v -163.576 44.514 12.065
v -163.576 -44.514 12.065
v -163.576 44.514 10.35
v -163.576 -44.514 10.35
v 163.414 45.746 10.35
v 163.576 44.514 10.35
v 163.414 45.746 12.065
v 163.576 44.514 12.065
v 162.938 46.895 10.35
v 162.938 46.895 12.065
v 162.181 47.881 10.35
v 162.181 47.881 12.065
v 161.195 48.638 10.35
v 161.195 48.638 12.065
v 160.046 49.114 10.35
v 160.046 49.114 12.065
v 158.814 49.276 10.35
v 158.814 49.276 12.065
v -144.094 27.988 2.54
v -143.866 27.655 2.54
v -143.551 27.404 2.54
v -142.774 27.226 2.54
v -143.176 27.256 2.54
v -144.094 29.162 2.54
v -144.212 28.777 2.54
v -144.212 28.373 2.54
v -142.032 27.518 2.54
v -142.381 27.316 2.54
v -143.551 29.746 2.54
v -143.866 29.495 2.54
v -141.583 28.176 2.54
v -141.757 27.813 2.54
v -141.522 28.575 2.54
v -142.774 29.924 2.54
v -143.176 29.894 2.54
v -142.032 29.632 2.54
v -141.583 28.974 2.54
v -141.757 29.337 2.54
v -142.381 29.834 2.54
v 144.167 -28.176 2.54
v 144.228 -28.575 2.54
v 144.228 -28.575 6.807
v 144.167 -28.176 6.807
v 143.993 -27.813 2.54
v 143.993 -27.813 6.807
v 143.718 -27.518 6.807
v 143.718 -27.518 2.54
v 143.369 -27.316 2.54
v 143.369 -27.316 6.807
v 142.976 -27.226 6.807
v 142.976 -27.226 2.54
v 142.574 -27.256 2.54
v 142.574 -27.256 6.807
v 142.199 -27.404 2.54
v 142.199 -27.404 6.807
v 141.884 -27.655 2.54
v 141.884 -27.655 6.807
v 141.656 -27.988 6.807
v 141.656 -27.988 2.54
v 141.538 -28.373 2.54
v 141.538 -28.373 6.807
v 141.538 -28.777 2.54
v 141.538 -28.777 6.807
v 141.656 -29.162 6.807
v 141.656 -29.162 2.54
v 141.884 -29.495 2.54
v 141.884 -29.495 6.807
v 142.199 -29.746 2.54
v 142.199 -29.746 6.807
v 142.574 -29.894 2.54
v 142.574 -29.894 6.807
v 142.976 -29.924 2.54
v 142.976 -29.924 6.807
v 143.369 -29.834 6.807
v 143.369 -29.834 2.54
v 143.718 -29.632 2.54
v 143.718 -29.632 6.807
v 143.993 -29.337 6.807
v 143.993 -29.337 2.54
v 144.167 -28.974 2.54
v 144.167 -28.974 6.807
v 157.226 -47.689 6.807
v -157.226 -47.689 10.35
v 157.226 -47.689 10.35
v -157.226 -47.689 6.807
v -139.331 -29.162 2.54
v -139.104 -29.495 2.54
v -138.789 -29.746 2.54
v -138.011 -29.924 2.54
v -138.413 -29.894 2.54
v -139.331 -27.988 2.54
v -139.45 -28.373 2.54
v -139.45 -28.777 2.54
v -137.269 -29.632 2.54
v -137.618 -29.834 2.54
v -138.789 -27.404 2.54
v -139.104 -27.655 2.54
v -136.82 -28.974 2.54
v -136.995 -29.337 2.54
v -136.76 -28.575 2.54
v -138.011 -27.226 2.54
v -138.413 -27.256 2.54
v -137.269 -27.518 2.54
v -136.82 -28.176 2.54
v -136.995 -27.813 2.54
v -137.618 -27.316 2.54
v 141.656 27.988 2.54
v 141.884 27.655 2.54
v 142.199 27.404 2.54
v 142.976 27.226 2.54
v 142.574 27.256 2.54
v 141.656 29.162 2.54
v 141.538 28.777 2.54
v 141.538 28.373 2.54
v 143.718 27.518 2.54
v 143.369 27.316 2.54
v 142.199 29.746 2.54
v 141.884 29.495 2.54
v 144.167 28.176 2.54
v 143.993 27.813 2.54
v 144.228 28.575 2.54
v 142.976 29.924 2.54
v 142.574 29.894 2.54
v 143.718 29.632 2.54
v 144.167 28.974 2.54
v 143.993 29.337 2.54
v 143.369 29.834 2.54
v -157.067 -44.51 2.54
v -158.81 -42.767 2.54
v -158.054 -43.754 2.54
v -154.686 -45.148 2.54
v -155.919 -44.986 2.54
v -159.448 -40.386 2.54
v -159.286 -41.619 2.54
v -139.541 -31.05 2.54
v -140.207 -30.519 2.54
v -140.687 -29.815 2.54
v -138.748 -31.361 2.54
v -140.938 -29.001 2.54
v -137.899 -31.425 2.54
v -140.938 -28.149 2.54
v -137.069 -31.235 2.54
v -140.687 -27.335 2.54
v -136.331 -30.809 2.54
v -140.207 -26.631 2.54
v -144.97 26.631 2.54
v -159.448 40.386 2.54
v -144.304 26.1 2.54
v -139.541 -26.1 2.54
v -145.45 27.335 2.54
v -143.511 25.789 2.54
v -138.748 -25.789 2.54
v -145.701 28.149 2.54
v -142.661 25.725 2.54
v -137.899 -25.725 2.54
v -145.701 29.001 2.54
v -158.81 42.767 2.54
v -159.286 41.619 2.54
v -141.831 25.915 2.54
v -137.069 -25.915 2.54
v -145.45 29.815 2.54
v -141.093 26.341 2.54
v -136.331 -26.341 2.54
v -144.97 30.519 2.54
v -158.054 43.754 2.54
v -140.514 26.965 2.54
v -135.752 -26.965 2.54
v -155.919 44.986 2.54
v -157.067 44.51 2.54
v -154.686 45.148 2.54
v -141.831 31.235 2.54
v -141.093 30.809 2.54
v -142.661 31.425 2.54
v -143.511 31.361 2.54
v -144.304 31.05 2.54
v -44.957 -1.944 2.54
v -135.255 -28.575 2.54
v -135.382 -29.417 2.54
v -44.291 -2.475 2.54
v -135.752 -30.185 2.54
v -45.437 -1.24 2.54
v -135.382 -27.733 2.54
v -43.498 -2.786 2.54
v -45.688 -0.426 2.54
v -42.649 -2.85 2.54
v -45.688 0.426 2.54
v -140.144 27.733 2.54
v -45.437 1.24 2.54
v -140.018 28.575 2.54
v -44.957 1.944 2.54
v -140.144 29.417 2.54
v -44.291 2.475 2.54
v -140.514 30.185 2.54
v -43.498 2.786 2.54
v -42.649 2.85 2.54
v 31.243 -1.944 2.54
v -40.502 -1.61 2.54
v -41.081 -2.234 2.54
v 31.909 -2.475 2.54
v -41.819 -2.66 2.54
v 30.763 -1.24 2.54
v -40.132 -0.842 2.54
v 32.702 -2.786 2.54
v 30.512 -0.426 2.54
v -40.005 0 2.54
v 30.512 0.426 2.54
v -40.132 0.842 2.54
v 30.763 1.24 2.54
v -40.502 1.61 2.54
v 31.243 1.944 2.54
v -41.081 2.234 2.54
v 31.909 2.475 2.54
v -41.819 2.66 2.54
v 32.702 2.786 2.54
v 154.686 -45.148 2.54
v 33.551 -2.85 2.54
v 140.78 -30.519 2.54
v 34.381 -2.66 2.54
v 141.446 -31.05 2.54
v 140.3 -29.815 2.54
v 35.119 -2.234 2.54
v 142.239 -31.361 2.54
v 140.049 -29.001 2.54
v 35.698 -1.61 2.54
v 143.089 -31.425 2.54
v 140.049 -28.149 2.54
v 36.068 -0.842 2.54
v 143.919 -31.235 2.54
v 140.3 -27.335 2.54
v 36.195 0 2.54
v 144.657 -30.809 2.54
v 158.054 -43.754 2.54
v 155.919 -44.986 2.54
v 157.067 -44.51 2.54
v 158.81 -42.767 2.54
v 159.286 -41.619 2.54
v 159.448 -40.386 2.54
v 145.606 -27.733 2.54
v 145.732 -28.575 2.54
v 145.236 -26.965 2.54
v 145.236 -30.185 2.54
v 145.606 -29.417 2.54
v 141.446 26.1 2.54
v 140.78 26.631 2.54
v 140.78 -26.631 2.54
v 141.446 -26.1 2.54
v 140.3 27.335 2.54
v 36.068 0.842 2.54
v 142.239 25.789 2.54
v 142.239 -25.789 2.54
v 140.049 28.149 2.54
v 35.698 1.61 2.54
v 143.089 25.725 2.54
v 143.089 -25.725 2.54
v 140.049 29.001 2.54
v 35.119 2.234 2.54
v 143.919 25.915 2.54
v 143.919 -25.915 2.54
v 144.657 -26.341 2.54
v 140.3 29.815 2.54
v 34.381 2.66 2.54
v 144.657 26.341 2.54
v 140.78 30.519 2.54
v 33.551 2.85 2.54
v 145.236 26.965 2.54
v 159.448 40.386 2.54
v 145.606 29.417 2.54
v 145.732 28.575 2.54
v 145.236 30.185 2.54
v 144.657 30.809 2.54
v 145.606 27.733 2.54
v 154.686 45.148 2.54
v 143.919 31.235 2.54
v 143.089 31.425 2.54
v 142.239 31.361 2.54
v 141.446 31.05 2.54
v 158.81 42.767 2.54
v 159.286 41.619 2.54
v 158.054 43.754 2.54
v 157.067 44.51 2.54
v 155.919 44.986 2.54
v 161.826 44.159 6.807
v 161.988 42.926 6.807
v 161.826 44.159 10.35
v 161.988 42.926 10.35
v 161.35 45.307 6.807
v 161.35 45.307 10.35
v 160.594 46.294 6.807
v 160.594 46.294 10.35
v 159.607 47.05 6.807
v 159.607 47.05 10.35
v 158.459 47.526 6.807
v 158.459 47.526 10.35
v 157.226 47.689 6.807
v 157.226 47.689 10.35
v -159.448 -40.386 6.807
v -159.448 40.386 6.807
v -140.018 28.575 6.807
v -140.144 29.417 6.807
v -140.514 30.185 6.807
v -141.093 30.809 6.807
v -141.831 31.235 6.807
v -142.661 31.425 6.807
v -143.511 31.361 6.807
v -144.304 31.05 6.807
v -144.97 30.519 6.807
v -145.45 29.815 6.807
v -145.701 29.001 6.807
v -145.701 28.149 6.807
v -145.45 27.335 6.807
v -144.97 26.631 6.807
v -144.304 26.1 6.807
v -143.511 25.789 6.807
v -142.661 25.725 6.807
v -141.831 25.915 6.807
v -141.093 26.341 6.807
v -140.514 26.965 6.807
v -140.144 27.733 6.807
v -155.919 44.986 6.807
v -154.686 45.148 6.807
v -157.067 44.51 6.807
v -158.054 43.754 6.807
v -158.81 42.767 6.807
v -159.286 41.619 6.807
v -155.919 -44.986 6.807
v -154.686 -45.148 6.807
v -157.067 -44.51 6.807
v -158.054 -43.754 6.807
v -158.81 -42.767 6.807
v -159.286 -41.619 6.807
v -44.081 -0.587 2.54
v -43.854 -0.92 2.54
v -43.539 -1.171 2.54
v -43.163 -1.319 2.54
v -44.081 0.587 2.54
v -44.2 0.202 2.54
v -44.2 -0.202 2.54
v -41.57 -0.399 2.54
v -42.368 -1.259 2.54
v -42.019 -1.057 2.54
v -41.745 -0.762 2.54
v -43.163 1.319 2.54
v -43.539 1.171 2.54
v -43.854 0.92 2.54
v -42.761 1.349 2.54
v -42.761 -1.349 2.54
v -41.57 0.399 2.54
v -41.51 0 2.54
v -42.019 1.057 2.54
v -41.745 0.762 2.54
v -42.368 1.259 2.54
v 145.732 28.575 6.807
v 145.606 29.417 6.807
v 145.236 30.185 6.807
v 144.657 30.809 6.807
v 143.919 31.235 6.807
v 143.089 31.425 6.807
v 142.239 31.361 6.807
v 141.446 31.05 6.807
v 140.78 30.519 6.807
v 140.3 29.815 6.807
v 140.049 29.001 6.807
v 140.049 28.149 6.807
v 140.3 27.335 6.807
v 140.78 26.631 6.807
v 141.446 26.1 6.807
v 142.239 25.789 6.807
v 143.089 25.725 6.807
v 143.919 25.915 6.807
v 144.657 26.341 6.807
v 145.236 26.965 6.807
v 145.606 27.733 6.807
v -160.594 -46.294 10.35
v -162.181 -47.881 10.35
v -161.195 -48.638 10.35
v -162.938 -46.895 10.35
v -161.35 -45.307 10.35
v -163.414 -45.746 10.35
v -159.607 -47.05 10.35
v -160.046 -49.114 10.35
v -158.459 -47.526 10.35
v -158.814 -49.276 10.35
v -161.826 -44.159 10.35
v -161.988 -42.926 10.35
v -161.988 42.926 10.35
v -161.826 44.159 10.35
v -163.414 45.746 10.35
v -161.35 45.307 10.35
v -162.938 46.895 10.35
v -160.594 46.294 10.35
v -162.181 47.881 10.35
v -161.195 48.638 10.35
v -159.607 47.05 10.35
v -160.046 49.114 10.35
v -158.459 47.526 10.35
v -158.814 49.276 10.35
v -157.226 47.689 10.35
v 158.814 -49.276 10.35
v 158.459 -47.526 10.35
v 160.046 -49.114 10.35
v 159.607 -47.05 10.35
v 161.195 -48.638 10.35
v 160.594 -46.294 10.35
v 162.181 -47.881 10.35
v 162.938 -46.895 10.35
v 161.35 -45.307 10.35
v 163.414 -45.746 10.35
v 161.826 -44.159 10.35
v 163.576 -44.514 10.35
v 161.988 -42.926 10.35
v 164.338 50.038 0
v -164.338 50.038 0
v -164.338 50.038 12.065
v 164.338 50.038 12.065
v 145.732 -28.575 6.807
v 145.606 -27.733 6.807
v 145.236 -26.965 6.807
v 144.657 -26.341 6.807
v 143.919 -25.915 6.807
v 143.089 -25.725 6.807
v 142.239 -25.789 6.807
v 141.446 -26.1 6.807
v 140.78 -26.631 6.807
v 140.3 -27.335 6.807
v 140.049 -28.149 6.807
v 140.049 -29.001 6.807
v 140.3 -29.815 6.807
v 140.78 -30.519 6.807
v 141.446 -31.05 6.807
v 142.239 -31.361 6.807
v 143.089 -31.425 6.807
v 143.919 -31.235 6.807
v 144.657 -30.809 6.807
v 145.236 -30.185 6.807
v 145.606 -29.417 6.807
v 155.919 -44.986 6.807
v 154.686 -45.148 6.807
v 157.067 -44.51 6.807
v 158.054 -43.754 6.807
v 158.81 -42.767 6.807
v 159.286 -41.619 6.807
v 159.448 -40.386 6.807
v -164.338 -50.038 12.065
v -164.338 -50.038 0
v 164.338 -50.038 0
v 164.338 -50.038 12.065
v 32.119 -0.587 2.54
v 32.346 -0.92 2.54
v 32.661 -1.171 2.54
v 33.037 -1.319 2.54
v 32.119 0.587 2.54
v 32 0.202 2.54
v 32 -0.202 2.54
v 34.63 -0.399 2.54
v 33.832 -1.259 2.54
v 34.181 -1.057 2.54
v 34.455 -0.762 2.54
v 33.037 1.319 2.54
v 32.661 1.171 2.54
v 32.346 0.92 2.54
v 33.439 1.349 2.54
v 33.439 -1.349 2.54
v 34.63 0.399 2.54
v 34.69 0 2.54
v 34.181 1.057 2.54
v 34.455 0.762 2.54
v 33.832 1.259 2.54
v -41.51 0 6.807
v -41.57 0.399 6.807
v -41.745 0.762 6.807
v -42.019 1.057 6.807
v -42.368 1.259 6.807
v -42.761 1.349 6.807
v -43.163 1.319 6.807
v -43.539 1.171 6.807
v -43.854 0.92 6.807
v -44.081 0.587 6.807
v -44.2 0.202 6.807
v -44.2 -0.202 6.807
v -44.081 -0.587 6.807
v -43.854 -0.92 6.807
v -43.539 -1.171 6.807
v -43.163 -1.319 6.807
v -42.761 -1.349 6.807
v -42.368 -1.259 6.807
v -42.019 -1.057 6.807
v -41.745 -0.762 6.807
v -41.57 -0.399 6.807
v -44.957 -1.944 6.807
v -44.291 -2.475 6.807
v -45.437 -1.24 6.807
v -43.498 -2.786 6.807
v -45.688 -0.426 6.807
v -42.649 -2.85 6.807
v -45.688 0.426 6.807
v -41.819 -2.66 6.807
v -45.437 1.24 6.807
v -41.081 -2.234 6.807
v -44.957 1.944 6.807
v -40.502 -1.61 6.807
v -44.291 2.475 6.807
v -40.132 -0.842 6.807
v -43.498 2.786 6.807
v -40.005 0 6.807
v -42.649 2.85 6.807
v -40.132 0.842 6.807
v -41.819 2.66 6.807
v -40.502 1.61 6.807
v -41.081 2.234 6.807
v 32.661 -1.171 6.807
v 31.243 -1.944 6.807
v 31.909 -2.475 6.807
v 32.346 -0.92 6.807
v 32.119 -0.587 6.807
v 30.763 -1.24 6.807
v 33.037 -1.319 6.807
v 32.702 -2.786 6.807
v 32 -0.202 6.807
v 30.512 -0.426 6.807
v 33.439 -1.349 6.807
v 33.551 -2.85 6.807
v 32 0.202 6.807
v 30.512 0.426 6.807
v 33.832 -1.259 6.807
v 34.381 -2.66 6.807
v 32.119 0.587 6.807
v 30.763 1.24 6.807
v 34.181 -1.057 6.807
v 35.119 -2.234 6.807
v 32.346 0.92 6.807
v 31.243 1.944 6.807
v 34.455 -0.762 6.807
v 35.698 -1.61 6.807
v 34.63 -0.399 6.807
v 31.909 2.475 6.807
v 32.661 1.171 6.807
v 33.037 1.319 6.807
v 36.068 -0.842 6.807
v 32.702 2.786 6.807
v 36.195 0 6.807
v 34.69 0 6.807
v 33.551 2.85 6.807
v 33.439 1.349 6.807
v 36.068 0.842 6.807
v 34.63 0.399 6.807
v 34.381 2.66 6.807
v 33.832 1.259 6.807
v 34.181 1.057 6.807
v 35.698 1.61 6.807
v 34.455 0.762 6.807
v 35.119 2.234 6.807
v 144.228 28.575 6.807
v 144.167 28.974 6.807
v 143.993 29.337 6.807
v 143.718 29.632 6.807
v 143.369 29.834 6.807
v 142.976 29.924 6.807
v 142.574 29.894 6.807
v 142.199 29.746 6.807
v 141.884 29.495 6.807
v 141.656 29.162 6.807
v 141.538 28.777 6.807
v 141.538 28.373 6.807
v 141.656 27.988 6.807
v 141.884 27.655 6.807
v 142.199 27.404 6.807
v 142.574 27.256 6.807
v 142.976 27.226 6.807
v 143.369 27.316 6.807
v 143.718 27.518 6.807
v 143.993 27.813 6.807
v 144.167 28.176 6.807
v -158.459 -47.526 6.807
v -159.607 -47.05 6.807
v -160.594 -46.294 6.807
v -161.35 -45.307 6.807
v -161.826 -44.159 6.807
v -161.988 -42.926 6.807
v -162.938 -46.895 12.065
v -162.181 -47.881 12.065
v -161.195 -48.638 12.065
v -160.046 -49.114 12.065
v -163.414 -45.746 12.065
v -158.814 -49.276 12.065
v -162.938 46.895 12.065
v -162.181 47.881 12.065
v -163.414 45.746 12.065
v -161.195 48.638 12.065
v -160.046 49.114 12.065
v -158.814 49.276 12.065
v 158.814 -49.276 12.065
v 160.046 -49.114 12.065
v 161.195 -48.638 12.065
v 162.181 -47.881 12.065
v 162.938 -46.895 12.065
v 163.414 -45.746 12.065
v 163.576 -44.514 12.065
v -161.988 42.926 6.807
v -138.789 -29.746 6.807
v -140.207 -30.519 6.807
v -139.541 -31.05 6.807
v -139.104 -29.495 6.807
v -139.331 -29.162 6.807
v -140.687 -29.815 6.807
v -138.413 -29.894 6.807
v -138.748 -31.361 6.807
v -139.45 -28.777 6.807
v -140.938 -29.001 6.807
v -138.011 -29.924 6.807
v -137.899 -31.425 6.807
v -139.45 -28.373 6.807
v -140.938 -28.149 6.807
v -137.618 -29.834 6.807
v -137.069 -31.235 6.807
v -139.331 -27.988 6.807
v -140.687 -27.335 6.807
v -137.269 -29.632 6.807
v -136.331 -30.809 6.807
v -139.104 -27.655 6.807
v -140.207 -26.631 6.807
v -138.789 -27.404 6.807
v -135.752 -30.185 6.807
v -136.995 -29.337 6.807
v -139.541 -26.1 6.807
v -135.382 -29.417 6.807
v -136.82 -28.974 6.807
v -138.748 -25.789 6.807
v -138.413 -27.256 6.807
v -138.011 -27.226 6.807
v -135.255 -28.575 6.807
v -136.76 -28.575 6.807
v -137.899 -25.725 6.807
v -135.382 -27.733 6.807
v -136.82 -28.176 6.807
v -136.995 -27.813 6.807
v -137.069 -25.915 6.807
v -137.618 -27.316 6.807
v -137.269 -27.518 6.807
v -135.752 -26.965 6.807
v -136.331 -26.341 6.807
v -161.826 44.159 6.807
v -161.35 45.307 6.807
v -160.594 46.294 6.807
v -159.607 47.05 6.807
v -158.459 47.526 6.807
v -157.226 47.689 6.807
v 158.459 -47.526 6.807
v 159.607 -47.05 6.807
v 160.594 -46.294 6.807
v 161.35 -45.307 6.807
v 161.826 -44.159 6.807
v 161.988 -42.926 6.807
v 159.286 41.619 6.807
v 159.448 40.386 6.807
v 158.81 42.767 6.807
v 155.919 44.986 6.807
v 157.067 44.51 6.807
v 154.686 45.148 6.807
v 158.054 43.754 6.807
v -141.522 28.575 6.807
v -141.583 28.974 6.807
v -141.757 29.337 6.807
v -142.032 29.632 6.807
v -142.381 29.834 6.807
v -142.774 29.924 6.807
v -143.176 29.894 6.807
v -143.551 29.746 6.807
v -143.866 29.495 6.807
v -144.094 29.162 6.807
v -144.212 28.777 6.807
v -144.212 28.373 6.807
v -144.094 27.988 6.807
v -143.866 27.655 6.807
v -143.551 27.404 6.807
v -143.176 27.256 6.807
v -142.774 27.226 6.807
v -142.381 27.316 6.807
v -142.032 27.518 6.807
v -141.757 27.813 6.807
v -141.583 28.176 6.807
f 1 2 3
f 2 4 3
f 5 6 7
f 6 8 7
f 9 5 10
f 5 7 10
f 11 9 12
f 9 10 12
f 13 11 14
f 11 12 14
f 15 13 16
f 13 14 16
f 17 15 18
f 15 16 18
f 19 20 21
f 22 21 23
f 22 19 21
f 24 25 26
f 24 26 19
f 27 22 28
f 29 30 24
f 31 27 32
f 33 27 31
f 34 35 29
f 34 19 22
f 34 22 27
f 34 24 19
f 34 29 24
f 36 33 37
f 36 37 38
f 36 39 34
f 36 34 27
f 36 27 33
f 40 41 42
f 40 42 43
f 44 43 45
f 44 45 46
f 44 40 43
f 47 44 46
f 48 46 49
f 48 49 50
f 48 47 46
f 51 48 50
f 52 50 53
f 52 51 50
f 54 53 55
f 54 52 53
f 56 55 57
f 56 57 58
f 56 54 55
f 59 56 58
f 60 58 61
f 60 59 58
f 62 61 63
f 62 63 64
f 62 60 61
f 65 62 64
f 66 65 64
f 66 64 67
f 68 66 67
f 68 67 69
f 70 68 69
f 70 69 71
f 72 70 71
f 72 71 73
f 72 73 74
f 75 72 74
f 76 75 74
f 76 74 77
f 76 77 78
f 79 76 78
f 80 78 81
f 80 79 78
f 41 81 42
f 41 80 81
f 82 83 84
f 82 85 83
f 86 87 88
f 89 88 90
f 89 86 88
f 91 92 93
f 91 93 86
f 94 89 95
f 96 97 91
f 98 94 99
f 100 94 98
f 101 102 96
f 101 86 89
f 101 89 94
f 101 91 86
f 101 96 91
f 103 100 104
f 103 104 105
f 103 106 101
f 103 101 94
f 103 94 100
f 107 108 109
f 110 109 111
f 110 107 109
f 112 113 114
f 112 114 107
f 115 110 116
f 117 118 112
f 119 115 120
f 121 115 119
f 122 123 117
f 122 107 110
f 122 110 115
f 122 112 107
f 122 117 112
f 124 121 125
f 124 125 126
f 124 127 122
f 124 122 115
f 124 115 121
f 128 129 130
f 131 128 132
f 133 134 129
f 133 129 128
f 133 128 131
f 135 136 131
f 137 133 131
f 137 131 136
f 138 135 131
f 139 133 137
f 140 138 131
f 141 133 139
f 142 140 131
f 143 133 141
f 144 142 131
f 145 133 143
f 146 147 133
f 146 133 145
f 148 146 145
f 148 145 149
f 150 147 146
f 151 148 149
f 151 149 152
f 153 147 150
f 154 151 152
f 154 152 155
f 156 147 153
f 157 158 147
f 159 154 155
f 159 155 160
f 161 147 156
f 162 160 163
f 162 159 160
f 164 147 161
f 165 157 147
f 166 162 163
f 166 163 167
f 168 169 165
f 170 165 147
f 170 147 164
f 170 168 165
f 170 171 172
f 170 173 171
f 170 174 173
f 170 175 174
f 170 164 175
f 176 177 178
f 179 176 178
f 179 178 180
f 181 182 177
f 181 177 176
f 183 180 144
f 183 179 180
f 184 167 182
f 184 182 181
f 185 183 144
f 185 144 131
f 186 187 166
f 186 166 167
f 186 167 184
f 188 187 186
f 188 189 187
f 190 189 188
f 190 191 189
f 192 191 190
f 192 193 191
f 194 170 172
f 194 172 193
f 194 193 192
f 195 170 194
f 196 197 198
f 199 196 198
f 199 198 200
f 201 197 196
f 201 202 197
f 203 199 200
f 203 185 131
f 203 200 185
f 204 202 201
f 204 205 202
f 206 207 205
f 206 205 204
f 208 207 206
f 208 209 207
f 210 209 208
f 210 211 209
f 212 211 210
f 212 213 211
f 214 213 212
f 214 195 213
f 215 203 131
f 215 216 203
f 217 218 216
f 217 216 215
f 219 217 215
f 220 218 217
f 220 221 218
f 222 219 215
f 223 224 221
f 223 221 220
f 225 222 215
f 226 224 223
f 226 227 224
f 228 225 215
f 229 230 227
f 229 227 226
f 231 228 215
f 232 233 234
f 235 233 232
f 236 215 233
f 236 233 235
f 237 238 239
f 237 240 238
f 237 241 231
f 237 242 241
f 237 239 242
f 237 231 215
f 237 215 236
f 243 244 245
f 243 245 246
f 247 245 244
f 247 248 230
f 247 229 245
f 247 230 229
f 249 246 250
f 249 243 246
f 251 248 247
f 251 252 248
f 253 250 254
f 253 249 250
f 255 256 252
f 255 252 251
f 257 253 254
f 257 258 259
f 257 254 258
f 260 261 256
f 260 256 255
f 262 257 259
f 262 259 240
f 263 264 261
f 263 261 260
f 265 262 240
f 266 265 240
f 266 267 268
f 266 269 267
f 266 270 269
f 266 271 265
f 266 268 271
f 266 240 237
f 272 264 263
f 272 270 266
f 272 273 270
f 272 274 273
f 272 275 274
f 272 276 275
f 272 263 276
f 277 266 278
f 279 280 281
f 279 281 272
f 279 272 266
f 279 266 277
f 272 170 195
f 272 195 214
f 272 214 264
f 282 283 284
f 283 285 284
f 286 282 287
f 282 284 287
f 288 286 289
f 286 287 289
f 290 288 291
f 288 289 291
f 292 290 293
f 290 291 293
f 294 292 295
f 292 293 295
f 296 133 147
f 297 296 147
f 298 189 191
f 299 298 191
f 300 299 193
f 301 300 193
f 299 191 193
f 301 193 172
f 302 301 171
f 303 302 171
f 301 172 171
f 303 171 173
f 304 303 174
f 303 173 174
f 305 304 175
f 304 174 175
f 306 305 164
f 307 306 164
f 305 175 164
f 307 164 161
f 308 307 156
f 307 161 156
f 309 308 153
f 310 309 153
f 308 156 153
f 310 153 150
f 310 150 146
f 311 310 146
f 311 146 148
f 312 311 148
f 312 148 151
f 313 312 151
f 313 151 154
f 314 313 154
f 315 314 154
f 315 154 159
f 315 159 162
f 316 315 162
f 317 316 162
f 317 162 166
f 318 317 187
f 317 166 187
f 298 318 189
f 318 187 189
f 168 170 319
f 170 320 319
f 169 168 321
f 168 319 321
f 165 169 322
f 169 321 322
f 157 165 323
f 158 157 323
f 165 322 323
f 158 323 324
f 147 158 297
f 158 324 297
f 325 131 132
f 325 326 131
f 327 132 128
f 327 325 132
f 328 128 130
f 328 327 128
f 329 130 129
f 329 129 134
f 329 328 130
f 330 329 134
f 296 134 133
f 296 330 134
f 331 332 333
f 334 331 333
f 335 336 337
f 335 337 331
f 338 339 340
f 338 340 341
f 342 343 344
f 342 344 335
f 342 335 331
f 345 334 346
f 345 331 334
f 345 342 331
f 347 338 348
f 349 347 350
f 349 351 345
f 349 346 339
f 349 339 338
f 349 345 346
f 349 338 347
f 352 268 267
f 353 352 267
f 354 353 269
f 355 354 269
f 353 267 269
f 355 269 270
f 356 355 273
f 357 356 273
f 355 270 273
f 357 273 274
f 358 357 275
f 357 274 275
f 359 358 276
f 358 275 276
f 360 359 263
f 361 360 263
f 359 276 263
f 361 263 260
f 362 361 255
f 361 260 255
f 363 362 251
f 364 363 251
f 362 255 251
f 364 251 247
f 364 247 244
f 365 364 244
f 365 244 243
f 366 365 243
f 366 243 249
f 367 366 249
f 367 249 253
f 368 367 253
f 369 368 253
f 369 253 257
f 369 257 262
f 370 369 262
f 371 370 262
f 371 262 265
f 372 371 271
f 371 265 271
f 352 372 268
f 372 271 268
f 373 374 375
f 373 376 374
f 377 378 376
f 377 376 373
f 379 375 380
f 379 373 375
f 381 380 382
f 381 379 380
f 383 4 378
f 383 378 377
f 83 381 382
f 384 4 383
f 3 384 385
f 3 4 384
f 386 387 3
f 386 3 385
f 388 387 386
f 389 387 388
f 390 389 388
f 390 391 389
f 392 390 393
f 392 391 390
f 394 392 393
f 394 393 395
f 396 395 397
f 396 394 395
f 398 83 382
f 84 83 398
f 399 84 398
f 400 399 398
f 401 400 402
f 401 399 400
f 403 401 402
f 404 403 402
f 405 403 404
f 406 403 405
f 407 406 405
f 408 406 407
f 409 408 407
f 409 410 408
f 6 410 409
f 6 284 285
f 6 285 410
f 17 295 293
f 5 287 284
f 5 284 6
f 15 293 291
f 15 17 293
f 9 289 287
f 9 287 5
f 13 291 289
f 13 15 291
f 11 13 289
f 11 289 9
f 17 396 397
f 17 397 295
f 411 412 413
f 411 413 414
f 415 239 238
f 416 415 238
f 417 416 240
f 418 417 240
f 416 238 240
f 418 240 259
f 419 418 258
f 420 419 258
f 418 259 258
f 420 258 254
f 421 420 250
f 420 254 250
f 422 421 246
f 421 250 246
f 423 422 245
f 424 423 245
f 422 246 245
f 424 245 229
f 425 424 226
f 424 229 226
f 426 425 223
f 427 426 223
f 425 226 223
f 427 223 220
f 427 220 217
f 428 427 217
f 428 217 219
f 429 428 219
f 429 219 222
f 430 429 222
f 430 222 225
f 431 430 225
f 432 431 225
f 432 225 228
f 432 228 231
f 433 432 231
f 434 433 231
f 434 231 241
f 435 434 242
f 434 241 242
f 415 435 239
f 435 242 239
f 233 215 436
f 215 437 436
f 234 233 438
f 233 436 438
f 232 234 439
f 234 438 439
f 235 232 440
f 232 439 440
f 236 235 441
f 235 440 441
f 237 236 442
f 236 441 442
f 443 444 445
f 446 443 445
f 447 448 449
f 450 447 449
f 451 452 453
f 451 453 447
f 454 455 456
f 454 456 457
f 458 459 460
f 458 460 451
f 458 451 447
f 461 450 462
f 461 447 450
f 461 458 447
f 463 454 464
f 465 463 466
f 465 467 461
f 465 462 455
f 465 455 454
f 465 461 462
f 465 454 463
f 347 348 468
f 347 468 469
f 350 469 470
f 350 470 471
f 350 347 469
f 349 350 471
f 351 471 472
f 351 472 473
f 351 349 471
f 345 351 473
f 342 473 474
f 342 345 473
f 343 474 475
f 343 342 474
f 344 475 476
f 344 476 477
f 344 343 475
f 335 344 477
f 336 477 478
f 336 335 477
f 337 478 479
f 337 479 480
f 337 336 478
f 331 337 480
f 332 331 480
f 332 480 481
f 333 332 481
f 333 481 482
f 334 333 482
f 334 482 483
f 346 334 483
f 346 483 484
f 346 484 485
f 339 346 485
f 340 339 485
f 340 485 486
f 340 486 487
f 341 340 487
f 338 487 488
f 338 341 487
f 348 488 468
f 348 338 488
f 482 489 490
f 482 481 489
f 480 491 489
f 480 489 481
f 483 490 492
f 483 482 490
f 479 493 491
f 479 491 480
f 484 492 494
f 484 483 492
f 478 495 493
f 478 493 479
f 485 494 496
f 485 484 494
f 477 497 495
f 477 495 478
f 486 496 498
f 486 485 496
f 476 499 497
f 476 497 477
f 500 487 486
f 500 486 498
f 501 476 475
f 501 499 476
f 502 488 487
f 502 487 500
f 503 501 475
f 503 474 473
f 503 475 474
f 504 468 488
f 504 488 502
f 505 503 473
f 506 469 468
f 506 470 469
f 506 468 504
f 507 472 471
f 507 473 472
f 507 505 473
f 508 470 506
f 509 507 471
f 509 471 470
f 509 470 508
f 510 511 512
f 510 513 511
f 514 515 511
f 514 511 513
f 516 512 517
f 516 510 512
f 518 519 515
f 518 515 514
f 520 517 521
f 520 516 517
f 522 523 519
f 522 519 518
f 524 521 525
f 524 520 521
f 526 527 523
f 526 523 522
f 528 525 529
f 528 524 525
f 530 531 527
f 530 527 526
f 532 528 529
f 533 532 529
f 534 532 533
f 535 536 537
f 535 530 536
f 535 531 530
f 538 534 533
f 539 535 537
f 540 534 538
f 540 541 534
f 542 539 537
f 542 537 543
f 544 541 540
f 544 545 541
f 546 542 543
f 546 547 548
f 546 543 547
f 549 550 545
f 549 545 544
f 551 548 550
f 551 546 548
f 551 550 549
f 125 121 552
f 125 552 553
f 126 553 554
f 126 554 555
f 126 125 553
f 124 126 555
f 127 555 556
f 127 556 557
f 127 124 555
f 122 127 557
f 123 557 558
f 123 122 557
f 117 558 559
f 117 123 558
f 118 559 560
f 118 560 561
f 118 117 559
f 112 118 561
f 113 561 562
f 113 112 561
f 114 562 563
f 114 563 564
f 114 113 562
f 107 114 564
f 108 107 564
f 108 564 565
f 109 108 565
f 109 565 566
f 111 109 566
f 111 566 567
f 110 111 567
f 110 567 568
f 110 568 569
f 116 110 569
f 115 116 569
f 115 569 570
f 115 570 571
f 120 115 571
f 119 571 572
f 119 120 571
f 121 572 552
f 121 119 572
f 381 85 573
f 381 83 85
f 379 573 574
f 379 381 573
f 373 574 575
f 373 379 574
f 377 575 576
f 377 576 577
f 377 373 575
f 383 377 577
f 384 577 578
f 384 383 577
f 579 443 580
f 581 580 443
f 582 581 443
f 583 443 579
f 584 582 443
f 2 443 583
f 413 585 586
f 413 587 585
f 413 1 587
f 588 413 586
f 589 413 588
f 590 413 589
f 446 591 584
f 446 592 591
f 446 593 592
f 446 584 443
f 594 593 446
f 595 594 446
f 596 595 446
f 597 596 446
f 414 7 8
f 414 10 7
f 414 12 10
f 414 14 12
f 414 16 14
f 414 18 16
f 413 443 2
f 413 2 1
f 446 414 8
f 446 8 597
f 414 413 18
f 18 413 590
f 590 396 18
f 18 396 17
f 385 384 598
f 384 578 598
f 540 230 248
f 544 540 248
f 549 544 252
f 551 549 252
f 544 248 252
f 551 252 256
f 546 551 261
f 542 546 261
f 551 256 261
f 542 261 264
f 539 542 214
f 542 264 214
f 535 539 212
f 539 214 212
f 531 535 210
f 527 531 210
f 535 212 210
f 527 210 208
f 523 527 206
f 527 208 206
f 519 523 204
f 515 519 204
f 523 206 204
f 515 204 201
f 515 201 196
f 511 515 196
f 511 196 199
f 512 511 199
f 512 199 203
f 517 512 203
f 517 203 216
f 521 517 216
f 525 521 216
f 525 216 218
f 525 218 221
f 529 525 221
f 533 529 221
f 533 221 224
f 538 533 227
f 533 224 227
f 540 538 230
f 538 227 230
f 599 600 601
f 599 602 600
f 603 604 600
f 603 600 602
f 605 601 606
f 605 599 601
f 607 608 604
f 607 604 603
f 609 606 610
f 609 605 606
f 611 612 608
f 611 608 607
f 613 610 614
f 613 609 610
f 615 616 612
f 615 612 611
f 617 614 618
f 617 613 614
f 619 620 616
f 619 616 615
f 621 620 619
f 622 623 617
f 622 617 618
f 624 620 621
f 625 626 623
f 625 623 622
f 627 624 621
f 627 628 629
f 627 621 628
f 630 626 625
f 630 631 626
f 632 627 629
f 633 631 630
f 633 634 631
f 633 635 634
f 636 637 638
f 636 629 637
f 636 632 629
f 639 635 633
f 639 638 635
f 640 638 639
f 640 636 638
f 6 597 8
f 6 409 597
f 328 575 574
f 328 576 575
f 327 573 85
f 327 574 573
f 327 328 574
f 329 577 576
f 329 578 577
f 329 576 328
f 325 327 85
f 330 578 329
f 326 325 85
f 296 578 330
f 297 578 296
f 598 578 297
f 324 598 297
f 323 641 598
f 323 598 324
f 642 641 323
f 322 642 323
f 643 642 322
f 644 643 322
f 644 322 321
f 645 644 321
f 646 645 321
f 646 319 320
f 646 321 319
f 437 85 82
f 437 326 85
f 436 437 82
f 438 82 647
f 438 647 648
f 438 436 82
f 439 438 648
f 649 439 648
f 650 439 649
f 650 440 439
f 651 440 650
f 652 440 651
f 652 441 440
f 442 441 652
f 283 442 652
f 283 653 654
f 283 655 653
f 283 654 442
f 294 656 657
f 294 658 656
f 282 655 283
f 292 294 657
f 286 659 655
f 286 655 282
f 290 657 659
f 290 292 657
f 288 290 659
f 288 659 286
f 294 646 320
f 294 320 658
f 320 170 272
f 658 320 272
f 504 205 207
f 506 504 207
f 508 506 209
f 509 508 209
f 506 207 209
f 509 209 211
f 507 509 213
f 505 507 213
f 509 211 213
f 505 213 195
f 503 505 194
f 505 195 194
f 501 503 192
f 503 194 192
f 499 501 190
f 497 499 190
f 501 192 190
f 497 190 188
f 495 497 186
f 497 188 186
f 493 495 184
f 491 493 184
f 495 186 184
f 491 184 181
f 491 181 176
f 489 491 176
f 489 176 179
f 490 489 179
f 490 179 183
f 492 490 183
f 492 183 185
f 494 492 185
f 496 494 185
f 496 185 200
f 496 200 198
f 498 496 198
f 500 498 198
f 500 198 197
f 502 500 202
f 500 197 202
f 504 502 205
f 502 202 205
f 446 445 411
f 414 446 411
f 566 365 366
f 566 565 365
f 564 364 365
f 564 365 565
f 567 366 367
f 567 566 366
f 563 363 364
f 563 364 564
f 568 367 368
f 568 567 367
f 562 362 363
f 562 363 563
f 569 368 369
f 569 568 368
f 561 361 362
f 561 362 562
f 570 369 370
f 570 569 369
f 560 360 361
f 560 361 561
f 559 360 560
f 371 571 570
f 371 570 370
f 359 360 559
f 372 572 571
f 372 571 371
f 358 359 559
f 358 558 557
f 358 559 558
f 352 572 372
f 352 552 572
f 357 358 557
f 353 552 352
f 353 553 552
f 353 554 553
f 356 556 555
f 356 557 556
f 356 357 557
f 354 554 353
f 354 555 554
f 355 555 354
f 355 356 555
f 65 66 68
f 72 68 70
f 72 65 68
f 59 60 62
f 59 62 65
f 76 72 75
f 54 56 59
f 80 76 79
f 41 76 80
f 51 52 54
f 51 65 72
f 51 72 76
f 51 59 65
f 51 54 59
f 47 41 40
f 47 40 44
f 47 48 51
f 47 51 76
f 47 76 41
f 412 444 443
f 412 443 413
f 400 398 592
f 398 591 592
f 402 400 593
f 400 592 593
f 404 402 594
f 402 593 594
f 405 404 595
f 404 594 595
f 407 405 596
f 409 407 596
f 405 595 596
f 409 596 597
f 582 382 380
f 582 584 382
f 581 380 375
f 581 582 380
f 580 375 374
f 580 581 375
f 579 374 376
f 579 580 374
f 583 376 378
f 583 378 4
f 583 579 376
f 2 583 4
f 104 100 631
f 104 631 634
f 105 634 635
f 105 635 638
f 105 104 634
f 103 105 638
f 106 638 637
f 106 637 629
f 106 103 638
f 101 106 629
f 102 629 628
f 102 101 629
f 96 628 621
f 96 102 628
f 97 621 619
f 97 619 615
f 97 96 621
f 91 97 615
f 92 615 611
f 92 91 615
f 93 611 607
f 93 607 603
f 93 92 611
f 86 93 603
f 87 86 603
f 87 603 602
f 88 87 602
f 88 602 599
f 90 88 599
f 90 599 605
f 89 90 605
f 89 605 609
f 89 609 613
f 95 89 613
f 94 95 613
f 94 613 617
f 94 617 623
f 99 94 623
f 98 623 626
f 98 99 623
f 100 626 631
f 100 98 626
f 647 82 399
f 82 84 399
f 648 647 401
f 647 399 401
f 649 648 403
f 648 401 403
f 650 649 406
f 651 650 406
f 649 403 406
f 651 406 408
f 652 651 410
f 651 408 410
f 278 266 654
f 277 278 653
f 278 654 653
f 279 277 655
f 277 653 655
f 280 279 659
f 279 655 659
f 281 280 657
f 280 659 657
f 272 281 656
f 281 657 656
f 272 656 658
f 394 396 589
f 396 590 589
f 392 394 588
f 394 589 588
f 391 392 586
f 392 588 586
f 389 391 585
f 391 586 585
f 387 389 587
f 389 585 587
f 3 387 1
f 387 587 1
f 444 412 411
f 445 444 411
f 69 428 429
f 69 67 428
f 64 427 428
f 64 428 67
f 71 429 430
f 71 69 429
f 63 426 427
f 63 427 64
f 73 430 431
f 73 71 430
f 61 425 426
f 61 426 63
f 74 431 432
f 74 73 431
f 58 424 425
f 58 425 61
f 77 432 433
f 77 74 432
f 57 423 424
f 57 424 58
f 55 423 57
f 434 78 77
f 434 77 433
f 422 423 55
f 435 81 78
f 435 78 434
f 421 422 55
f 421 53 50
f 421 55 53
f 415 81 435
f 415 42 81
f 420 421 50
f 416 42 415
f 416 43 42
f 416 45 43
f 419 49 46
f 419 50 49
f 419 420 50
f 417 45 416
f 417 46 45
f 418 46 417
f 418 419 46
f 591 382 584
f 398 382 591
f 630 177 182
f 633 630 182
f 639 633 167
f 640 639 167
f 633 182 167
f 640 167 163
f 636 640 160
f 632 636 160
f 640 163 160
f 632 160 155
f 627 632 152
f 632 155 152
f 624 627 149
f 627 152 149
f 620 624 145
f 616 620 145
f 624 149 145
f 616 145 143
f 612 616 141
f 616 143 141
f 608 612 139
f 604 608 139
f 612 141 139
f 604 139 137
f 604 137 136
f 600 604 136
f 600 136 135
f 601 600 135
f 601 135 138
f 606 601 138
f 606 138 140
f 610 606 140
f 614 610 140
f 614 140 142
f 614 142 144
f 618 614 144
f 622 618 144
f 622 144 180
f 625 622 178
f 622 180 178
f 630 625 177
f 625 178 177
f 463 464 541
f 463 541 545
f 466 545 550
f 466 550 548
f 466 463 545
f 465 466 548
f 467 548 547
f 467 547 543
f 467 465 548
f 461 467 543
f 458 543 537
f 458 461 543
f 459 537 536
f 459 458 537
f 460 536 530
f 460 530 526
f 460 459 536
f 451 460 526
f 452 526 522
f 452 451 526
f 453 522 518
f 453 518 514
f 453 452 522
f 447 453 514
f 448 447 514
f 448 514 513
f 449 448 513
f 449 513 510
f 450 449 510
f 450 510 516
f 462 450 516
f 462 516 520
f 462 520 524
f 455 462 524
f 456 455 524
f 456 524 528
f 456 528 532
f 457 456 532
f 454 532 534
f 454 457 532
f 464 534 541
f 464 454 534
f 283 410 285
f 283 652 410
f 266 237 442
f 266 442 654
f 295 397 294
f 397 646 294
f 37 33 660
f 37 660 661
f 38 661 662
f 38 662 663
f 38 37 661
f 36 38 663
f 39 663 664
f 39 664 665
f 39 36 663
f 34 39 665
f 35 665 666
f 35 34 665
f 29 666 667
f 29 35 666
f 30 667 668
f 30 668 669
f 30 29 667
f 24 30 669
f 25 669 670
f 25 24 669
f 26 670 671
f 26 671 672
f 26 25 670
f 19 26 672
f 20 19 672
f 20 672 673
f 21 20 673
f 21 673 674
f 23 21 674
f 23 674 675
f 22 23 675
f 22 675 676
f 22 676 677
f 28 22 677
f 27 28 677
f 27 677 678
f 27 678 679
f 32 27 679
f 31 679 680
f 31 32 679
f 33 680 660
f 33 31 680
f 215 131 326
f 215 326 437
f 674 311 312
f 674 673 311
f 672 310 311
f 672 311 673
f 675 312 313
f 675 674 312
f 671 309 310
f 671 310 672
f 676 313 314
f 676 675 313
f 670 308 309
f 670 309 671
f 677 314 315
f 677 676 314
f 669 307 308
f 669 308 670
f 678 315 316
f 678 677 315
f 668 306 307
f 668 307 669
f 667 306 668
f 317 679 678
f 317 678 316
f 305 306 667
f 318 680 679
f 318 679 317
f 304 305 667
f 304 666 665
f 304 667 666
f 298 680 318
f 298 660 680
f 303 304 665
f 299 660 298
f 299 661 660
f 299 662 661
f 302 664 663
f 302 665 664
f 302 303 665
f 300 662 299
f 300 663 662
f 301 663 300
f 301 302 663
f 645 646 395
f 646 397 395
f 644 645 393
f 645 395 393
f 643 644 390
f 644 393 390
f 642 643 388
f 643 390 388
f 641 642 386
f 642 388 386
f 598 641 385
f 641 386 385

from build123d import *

# Parameters (mm, degrees)
SKETCH1_W           = 328.676
SKETCH1_H           = 100.076
SKETCH1_W_2         = 327.152
SKETCH1_H_2         = 98.552
SKETCH1_W_3         = 323.977
SKETCH1_H_3         = 95.377
SKETCH1_W_4         = 318.897
SKETCH1_H_4         = 90.297
BOSS_EXTRUDE1_DEPTH = 2.54
SKETCH1_3_W         = 328.676
SKETCH1_3_H         = 100.076
SKETCH1_3_W_2       = 327.152
SKETCH1_3_H_2       = 98.552
BOSS_EXTRUDE2_DEPTH = 12.065
SKETCH1_4_W         = 327.152
SKETCH1_4_H         = 98.552
SKETCH1_4_W_2       = 323.977
SKETCH1_4_H_2       = 95.377
BOSS_EXTRUDE3_DEPTH = 10.3505
SKETCH1_5_W         = 323.977
SKETCH1_5_H         = 95.377
SKETCH1_5_W_2       = 318.897
SKETCH1_5_H_2       = 90.297
BOSS_EXTRUDE4_DEPTH = 6.8072
FILLET1_R           = 4.7625
SKETCH2_R           = 2.8575
SKETCH2_R_2         = 1.35255
BOSS_EXTRUDE5_DEPTH = 4.2672


with BuildPart() as part:
    # Sketch1 → Boss-Extrude1 (new body)
    # profile 1 of 4: a face of its own
    with BuildSketch(Plane.XY):
        Rectangle(SKETCH1_W, SKETCH1_H)
        Rectangle(SKETCH1_W_2, SKETCH1_H_2, mode=Mode.SUBTRACT)
    # profile 2 of 4: a face of its own
    with BuildSketch(Plane.XY):
        Rectangle(SKETCH1_W_2, SKETCH1_H_2)
        Rectangle(SKETCH1_W_3, SKETCH1_H_3, mode=Mode.SUBTRACT)
    # profile 3 of 4: a face of its own
    with BuildSketch(Plane.XY):
        Rectangle(SKETCH1_W_3, SKETCH1_H_3)
    # profile 4 of 4: a face of its own
    with BuildSketch(Plane.XY):
        Rectangle(SKETCH1_W_4, SKETCH1_H_4)
    extrude(amount=BOSS_EXTRUDE1_DEPTH)

    # Sketch1<3> → Boss-Extrude2 (add)
    with BuildSketch(Plane.XY):
        Rectangle(SKETCH1_3_W, SKETCH1_3_H)
        Rectangle(SKETCH1_3_W_2, SKETCH1_3_H_2, mode=Mode.SUBTRACT)
    extrude(amount=BOSS_EXTRUDE2_DEPTH)

    # Sketch1<4> → Boss-Extrude3 (add)
    with BuildSketch(Plane.XY):
        Rectangle(SKETCH1_4_W, SKETCH1_4_H)
        Rectangle(SKETCH1_4_W_2, SKETCH1_4_H_2, mode=Mode.SUBTRACT)
    extrude(amount=BOSS_EXTRUDE3_DEPTH)

    # Sketch1<5> → Boss-Extrude4 (add)
    with BuildSketch(Plane.XY):
        Rectangle(SKETCH1_5_W, SKETCH1_5_H)
        Rectangle(SKETCH1_5_W_2, SKETCH1_5_H_2, mode=Mode.SUBTRACT)
    extrude(amount=BOSS_EXTRUDE4_DEPTH)

    # Fillet1
    fillet1_edges = [part.edges().sort_by_distance(p)[0] for p in [
        (159.4485, 45.1485, 4.6736),
        (159.4485, -45.1485, 4.6736),
        (-159.4485, -45.1485, 4.6736),
        (-159.4485, 45.1485, 4.6736),
        (163.576, -49.276, 11.20775),
        (-163.576, -49.276, 11.20775),
        (-163.576, 49.276, 11.20775),
        (163.576, 49.276, 11.20775),
        (161.9885, 47.6885, 8.57885),
        (-161.9885, 47.6885, 8.57885),
        (-161.9885, -47.6885, 8.57885),
        (161.9885, -47.6885, 8.57885),
    ]]
    fillet(fillet1_edges, radius=FILLET1_R)

    # Sketch2 → Boss-Extrude5 (add)
    # profile 1 of 6: a face of its own
    with BuildSketch(Plane.XY.offset(2.54)):
        with Locations((142.875, -28.575)):
            Circle(SKETCH2_R)
        with Locations((142.875, -28.575)):
            Circle(SKETCH2_R_2, mode=Mode.SUBTRACT)
    # profile 2 of 6: a face of its own
    with BuildSketch(Plane.XY.offset(2.54)):
        with Locations((142.875, 28.575)):
            Circle(SKETCH2_R)
        with Locations((142.875, 28.575)):
            Circle(SKETCH2_R_2, mode=Mode.SUBTRACT)
    # profile 3 of 6: a face of its own
    with BuildSketch(Plane.XY.offset(2.54)):
        with Locations((-42.8625, 0)):
            Circle(SKETCH2_R)
        with Locations((-42.8625, 0)):
            Circle(SKETCH2_R_2, mode=Mode.SUBTRACT)
    # profile 4 of 6: a face of its own
    with BuildSketch(Plane.XY.offset(2.54)):
        with Locations((33.3375, 0)):
            Circle(SKETCH2_R)
        with Locations((33.3375, 0)):
            Circle(SKETCH2_R_2, mode=Mode.SUBTRACT)
    # profile 5 of 6: a face of its own
    with BuildSketch(Plane.XY.offset(2.54)):
        with Locations((-142.875, 28.575)):
            Circle(SKETCH2_R)
        with Locations((-142.875, 28.575)):
            Circle(SKETCH2_R_2, mode=Mode.SUBTRACT)
    # profile 6 of 6: a face of its own
    with BuildSketch(Plane.XY.offset(2.54)):
        with Locations((-138.1125, -28.575)):
            Circle(SKETCH2_R)
        with Locations((-138.1125, -28.575)):
            Circle(SKETCH2_R_2, mode=Mode.SUBTRACT)
    extrude(amount=BOSS_EXTRUDE5_DEPTH)


solid = part.part
